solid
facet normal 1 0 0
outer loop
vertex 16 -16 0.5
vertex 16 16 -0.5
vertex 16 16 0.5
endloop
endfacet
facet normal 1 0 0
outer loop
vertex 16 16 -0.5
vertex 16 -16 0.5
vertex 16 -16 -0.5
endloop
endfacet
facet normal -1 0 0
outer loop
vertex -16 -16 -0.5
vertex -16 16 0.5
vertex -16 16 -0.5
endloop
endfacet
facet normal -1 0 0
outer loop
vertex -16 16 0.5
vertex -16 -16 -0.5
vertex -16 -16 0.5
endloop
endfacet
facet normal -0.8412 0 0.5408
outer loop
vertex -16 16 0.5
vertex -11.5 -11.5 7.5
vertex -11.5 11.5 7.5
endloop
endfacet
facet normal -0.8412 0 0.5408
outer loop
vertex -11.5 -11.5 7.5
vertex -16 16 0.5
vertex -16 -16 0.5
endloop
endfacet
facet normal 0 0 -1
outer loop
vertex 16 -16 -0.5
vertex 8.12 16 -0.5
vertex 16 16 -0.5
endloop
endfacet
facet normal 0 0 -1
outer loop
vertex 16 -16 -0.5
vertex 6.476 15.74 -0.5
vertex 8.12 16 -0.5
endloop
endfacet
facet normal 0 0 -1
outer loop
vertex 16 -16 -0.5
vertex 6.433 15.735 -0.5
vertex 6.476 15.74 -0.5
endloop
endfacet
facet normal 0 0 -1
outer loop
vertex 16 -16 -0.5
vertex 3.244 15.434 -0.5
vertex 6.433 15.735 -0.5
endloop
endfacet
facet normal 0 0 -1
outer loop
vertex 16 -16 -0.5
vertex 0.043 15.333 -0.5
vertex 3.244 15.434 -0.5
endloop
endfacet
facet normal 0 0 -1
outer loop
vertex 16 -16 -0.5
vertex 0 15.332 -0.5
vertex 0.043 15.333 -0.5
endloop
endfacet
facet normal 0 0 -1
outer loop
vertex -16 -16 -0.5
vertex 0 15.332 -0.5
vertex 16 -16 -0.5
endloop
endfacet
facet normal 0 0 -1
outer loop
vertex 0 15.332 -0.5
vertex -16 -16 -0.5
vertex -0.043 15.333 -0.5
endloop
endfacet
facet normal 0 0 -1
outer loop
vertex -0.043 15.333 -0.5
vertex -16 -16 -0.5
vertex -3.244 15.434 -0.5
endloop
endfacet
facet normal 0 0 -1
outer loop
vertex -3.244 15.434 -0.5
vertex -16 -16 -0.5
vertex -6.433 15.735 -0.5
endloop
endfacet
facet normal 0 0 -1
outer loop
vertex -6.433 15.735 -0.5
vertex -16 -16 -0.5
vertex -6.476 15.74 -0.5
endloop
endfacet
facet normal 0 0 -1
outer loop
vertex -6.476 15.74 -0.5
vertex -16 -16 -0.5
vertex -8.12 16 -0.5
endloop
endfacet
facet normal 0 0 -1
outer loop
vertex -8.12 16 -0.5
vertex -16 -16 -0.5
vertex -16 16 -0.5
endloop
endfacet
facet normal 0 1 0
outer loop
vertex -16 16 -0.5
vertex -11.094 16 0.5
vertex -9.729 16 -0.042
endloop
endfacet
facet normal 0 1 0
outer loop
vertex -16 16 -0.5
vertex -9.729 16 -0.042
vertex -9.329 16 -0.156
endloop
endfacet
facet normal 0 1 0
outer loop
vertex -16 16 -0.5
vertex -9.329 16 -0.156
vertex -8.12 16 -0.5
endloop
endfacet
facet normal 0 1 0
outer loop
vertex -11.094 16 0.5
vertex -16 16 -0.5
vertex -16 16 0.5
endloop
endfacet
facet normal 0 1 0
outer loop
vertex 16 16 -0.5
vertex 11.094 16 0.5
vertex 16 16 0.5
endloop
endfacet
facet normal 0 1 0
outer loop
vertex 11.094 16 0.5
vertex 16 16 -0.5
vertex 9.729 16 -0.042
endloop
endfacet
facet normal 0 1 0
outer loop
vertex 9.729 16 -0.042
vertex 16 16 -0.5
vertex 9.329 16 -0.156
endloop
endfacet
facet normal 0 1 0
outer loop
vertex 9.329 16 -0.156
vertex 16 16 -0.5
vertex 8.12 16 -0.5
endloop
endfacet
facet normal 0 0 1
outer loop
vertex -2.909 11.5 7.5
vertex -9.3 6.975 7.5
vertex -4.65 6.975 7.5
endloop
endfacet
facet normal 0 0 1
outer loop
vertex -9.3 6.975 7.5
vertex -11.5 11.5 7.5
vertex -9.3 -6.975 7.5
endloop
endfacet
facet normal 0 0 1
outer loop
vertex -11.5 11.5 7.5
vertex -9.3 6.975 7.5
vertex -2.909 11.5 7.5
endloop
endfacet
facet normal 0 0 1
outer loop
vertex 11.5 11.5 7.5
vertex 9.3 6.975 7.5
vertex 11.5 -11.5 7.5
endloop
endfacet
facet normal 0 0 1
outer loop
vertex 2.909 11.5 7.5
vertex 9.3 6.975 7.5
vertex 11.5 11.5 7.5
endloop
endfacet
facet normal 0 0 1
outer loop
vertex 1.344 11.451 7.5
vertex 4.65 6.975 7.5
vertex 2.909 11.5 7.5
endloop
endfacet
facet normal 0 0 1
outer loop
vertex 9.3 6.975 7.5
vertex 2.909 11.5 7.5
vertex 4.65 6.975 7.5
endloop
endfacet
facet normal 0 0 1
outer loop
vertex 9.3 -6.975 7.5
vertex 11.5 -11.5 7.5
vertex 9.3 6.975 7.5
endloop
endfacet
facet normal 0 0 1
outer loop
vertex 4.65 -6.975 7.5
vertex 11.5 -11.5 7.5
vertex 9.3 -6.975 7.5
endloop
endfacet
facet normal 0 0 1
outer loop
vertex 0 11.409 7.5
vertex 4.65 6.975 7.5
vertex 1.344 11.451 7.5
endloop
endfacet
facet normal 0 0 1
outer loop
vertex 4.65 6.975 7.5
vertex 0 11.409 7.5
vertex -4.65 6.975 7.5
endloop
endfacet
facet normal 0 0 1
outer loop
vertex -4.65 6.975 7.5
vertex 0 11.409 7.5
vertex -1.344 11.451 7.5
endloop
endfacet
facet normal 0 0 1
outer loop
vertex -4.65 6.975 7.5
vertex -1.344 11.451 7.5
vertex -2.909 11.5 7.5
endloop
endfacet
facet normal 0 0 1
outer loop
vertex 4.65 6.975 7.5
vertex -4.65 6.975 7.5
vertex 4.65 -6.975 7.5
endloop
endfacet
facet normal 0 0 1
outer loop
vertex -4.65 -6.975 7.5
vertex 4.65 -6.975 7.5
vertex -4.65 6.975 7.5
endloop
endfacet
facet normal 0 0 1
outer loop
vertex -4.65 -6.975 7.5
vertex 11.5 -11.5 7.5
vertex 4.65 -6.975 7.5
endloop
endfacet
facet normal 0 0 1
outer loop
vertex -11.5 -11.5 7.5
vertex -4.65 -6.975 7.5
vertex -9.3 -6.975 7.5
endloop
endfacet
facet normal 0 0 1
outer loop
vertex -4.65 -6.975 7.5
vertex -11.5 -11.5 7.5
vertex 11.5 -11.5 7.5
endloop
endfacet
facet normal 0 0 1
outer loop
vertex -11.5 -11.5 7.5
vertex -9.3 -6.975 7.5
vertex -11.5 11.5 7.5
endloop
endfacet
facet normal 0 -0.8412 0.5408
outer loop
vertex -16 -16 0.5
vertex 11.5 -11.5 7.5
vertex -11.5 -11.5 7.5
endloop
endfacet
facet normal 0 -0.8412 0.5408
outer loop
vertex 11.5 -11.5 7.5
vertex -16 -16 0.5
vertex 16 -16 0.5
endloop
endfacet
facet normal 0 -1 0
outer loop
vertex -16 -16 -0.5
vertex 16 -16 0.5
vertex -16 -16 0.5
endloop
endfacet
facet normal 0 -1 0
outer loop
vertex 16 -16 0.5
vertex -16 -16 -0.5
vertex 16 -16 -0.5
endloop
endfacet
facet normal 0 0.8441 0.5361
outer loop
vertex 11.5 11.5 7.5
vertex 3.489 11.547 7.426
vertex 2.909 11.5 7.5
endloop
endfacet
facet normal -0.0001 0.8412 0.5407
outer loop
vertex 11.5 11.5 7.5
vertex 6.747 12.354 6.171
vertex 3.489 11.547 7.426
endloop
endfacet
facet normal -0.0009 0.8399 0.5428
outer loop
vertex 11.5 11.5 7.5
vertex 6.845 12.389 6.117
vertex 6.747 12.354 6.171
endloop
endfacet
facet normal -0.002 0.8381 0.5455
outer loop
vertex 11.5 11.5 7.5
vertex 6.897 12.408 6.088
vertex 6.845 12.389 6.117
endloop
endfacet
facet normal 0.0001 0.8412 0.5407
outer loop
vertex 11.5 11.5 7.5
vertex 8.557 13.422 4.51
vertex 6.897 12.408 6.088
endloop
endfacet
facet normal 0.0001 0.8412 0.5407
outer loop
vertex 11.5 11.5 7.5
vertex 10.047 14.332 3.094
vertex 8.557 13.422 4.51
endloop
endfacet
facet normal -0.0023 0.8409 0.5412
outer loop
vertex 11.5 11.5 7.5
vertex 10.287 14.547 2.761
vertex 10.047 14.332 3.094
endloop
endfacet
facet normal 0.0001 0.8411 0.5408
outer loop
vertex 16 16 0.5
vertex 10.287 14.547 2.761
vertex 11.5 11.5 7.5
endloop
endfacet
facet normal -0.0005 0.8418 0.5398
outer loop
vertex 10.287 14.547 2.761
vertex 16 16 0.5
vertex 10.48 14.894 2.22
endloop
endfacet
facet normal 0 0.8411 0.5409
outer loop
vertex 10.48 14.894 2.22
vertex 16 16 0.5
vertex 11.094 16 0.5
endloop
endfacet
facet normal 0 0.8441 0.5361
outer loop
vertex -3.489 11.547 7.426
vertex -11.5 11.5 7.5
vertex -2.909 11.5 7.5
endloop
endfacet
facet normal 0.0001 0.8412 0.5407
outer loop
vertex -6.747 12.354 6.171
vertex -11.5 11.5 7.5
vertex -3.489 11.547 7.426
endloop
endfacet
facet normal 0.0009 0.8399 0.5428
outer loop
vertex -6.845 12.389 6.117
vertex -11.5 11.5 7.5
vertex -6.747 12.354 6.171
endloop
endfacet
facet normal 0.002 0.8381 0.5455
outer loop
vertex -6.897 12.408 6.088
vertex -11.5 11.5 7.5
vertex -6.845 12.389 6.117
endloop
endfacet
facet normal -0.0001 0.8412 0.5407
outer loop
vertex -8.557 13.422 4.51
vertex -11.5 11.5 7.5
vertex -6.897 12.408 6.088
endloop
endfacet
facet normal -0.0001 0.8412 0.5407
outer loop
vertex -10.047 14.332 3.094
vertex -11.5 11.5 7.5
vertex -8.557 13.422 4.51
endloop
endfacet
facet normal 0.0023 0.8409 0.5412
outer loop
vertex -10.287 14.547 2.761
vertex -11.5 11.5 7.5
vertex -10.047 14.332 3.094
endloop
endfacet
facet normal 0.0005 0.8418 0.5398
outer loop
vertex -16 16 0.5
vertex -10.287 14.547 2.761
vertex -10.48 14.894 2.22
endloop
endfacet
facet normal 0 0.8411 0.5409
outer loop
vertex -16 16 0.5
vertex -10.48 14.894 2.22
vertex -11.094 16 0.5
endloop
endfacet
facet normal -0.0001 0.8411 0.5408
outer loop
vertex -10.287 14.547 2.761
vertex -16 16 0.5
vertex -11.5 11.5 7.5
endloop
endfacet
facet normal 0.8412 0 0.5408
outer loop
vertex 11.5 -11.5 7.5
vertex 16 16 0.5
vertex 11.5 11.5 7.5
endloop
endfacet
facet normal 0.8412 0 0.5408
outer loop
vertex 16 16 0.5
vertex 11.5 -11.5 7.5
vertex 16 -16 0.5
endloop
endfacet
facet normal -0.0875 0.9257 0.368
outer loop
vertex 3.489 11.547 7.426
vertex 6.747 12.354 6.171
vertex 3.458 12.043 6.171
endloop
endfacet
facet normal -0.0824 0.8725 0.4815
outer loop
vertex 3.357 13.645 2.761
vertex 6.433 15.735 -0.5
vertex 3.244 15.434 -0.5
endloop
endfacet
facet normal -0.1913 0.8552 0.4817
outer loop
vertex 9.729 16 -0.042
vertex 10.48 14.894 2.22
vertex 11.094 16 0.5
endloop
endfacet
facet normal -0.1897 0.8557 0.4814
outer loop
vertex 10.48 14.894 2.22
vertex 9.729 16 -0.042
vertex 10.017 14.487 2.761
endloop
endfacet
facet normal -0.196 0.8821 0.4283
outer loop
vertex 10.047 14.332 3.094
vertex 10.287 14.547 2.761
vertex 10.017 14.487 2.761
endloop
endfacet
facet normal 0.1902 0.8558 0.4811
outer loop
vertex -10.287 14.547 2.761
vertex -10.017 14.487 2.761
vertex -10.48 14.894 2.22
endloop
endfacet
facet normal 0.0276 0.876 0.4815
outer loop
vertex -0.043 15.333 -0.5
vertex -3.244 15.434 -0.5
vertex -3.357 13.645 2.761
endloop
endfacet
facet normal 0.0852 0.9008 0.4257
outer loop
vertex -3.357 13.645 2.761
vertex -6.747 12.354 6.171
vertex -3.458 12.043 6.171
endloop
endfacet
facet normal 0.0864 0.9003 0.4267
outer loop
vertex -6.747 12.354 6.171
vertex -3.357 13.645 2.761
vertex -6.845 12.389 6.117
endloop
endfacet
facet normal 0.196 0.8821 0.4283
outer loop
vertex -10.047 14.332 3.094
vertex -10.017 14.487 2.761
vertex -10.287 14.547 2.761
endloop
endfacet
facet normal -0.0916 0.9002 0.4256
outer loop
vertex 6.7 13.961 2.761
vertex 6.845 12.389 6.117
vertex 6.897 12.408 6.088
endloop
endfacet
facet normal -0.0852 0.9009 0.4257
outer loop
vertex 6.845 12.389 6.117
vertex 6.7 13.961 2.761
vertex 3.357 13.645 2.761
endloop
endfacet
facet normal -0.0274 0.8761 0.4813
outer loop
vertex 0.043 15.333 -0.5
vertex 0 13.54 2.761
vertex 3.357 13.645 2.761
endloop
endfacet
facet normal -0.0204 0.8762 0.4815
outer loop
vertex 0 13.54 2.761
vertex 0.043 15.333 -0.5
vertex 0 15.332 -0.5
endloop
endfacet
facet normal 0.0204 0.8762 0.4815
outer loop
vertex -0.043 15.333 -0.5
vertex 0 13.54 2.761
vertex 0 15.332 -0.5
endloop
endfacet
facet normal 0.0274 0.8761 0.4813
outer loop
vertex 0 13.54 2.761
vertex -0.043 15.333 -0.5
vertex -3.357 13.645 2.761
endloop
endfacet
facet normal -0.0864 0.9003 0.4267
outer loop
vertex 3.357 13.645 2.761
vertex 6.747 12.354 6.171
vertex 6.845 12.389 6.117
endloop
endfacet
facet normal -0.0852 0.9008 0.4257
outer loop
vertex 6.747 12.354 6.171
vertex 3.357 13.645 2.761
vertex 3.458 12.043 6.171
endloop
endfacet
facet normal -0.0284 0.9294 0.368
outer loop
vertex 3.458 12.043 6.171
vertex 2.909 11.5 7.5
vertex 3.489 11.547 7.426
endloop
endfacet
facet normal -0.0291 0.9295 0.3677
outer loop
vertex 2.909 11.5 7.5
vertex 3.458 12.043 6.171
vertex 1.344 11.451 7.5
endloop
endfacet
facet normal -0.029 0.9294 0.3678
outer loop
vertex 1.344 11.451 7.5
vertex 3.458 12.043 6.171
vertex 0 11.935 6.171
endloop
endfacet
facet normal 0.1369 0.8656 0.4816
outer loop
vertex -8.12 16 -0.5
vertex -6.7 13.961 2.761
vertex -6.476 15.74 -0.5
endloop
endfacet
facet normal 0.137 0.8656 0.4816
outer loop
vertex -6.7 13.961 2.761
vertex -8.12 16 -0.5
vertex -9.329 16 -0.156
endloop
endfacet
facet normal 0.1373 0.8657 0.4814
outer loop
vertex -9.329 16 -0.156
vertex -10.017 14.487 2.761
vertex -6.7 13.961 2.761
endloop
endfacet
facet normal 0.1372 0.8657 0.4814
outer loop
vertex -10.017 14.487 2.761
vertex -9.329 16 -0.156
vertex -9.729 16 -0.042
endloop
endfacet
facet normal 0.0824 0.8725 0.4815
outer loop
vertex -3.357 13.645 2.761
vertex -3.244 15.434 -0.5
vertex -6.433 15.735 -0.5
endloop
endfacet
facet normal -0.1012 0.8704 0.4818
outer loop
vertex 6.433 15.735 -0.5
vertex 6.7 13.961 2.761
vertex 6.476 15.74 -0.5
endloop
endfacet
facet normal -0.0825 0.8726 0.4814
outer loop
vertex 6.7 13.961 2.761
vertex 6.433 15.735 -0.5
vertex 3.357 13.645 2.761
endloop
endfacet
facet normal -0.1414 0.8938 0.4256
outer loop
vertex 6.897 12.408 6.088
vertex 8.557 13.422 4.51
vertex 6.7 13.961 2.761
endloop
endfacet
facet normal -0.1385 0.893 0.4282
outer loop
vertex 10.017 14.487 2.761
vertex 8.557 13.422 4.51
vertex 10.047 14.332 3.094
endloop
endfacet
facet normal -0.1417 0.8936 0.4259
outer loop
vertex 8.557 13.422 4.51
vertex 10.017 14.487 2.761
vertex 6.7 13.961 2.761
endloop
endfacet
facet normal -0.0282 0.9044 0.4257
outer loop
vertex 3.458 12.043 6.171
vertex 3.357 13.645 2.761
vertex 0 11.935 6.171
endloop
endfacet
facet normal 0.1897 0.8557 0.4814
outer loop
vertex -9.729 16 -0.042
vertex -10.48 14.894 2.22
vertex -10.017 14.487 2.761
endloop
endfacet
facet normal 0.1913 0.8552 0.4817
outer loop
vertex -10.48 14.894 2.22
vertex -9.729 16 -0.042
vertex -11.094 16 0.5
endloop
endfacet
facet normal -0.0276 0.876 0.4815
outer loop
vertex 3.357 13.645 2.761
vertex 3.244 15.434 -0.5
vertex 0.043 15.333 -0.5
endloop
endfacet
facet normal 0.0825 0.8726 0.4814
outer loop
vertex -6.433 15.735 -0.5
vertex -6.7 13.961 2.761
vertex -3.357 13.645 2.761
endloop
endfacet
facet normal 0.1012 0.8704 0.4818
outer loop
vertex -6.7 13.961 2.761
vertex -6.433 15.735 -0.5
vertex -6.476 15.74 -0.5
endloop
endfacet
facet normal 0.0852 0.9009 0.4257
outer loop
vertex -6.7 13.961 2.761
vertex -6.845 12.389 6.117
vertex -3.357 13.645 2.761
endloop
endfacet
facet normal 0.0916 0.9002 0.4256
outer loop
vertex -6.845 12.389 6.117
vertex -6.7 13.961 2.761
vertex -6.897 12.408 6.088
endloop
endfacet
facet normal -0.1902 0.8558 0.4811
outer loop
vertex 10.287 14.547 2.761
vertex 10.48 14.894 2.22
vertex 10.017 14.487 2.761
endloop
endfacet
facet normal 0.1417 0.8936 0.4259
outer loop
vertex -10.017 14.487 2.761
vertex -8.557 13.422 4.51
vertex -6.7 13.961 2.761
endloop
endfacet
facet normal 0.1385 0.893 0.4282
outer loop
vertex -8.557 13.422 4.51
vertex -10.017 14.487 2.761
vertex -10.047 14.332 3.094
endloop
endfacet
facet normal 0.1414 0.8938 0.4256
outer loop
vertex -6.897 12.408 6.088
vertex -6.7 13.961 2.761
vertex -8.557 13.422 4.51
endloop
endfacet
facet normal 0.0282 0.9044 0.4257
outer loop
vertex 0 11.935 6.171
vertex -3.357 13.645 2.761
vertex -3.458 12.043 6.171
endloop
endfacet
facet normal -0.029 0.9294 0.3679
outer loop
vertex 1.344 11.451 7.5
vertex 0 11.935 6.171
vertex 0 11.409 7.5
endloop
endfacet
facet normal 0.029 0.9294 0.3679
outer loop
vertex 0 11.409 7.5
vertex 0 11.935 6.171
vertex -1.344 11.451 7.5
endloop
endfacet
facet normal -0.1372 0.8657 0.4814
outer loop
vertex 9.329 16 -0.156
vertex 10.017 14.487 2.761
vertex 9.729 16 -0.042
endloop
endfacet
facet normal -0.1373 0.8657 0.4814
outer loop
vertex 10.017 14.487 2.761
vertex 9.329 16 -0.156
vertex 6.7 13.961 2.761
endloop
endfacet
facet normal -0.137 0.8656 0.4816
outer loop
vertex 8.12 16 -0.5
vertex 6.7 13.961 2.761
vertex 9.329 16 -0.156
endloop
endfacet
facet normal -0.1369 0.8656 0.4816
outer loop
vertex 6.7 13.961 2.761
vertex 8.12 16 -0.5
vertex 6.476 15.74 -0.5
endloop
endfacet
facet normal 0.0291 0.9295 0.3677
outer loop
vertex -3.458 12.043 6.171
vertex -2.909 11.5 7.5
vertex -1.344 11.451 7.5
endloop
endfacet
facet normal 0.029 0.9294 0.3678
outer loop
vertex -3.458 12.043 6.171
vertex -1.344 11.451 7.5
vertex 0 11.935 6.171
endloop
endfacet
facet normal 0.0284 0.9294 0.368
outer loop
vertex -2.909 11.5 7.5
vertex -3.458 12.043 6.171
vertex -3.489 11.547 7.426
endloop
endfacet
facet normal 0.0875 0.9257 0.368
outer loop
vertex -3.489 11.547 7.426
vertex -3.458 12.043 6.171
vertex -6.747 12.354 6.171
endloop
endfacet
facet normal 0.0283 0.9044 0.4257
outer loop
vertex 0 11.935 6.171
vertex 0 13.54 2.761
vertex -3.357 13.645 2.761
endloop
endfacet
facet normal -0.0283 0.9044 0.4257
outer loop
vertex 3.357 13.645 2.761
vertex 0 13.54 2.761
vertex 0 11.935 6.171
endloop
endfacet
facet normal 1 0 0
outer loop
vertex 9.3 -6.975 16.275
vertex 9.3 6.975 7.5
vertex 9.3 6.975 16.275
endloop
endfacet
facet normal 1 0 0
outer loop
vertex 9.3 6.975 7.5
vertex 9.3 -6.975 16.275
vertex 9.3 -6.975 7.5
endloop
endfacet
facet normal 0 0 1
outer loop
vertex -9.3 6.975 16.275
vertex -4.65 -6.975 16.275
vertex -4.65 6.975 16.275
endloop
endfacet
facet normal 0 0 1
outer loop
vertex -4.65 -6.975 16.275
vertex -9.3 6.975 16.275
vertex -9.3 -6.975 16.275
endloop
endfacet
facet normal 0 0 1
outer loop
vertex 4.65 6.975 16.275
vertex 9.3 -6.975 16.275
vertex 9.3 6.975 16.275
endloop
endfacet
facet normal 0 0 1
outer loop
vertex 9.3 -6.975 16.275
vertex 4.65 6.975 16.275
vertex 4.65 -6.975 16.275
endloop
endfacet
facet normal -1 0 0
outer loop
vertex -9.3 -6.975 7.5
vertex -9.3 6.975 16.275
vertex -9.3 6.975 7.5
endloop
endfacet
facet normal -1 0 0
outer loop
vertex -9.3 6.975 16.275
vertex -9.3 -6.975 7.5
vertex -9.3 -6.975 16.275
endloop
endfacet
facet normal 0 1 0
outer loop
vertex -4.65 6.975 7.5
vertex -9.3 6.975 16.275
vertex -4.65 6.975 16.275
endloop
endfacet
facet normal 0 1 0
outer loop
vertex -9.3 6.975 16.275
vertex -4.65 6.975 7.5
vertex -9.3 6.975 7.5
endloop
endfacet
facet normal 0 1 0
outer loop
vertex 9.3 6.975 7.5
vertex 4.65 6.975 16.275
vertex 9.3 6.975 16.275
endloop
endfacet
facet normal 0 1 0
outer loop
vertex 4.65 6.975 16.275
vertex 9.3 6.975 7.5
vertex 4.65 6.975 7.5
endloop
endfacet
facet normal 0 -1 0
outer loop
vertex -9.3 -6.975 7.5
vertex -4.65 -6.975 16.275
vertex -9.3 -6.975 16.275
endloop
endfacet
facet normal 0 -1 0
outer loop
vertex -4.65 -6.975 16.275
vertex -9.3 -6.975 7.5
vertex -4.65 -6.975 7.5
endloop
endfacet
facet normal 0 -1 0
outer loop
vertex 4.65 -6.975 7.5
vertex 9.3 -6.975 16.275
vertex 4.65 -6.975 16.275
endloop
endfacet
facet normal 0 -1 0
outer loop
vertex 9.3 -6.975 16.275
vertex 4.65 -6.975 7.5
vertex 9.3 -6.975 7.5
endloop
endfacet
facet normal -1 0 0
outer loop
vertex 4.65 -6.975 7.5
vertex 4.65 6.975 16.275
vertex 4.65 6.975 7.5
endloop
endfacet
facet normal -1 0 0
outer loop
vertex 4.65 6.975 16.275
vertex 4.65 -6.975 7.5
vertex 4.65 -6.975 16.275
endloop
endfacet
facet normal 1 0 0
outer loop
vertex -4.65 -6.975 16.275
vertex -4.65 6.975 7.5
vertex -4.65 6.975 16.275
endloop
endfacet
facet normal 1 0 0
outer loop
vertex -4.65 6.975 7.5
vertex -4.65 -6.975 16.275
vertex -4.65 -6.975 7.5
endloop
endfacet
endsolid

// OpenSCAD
IPHONE_WIDTH = 9.3;

module base() {
	difference(){
		hull() {
			cube(size = [32,32,1], center = true);
 			translate([0,0,7]) cube(size = [23,23,1], center = true);
		}
		translate([0,67,30]) sphere(r = 60, $fn = 100);
	}
}

module holder(width) {
	difference() {
		cube(size= [width * 2, width * 1.5, width * 1.5], center = true);
		cube(size = [width, width * 2, width * 1.5], center = true);
	}
}


base();
translate ([0,0,IPHONE_WIDTH]) holder(IPHONE_WIDTH);
